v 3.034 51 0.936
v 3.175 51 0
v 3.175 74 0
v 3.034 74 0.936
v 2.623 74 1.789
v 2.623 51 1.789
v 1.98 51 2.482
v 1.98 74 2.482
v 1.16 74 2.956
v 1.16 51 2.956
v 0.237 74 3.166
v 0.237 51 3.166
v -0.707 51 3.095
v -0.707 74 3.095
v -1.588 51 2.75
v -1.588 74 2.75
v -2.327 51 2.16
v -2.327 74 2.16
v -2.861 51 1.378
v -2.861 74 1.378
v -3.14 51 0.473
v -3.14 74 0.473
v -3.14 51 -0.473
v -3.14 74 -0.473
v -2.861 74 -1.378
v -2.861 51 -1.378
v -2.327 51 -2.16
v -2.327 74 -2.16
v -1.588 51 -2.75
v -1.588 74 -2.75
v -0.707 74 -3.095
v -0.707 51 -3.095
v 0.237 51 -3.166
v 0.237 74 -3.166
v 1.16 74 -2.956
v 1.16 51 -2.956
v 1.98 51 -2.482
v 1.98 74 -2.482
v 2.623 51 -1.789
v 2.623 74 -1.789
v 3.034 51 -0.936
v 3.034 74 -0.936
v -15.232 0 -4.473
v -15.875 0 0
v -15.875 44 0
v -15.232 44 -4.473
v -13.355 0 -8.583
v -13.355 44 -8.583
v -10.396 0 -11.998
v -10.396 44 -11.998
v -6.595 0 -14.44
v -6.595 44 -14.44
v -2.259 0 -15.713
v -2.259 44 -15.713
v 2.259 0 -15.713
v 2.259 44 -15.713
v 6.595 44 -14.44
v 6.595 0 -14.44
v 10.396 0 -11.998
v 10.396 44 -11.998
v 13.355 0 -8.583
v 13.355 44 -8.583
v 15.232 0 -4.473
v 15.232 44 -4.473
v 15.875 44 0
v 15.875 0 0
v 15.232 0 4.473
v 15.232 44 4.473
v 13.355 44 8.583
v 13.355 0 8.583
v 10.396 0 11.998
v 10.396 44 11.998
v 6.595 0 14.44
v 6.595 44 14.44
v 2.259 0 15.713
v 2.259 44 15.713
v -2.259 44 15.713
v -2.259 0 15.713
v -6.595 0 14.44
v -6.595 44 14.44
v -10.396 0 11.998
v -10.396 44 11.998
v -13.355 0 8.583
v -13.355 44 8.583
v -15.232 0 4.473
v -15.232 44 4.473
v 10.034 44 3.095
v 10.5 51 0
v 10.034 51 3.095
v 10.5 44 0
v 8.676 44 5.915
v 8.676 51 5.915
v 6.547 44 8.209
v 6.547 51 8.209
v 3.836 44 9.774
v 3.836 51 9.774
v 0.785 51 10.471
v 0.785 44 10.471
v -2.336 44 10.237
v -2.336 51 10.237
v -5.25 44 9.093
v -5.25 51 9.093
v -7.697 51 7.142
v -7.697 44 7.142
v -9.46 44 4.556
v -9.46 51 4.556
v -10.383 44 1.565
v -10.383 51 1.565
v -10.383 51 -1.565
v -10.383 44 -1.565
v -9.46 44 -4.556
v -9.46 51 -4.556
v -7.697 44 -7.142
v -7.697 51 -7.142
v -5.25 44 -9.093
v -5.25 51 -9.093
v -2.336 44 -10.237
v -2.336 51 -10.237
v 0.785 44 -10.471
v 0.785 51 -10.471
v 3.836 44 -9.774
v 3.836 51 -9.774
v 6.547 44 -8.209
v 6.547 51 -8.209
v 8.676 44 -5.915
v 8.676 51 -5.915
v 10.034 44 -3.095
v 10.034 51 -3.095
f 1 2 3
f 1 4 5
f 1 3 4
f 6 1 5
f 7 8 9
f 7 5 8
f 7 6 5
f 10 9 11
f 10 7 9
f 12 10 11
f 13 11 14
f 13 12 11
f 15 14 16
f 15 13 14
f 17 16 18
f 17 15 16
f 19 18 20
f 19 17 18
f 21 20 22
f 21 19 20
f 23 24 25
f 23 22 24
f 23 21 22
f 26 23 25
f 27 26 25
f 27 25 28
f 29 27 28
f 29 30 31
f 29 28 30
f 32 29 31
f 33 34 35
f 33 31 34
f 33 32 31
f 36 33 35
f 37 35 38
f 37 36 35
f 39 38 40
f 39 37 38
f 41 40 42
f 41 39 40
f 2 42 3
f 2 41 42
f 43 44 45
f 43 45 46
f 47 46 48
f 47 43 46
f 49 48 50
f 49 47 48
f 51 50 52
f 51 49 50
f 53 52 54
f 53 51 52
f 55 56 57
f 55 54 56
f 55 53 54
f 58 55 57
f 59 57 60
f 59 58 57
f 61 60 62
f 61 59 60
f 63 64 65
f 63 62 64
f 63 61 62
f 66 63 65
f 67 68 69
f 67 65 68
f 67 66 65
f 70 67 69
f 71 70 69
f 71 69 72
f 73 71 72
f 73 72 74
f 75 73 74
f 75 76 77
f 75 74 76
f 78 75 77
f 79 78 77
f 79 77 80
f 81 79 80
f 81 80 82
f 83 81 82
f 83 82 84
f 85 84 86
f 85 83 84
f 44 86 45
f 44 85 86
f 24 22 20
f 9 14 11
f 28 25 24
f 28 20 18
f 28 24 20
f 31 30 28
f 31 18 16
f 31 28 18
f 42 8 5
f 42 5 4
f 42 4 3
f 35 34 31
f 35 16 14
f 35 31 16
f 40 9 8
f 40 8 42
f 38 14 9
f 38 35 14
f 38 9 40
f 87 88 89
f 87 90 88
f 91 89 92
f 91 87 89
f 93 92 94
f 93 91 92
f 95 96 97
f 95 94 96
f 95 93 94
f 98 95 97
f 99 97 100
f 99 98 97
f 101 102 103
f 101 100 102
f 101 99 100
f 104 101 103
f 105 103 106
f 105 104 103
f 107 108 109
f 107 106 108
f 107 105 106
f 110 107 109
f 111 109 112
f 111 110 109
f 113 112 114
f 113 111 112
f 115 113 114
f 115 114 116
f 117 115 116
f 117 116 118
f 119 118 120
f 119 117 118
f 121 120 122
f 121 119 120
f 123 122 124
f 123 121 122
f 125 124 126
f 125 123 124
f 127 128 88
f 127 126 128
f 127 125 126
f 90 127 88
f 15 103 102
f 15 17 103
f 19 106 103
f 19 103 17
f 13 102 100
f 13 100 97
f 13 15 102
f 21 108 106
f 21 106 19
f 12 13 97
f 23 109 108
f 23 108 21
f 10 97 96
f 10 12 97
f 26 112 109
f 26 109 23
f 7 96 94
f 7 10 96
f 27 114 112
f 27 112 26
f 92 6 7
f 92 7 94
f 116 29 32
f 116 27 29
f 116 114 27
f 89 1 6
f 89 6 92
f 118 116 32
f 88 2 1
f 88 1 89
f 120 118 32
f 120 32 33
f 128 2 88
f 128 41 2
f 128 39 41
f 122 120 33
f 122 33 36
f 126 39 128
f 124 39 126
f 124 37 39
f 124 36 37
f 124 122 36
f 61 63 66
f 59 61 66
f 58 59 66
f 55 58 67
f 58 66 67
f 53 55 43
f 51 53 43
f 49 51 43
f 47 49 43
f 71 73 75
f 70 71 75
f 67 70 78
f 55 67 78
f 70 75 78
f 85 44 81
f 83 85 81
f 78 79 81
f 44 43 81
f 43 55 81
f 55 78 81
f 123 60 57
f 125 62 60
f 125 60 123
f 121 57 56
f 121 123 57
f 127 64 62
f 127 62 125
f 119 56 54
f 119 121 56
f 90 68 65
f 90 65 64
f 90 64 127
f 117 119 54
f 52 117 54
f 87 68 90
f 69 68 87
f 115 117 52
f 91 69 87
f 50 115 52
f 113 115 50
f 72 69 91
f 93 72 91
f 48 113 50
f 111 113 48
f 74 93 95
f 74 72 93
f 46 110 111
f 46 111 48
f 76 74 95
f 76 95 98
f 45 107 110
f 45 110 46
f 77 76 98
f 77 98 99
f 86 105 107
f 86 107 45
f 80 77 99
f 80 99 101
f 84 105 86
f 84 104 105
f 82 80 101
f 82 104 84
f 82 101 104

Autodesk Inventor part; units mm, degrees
ref_plane "YZ Plane" through (0, 0, 0) normal (1, 0, 0) x (0, 1, 0)
ref_plane "XZ Plane" through (0, 0, 0) normal (0, 1, 0) x (-1, 0, 0)
ref_plane "XY Plane" through (0, 0, 0) normal (0, 0, 1) x (1, 0, 0)
sketch "Sketch1" plane through (0, 0, 0) normal (0, 1, 0) x (-1, 0, 0)
  circle A0 centre (0, 0) radius 15.875
extrude "Extrusion1" add sketch "Sketch1" along normal blind 44
sketch "Sketch2" plane through (0, 44, 0) normal (0, 1, 0) x (1, 0, 0)
  circle A0 centre (0, 0) radius 10.5
  dimension "d2" = 21
extrude "Extrusion2" add sketch "Sketch2" along normal blind 7
sketch "Sketch3" plane through (0, 51, 0) normal (0, 1, 0) x (1, 0, 0)
  circle A0 centre (0, 0) radius 3.175
extrude "Extrusion3" add sketch "Sketch3" along normal blind 23
sketch "Sketch4" plane through (0, 0, 0) normal (0, -1, 0) x (1, 0, 0)
  point P0 (0, 0)
properties part number "dc"
